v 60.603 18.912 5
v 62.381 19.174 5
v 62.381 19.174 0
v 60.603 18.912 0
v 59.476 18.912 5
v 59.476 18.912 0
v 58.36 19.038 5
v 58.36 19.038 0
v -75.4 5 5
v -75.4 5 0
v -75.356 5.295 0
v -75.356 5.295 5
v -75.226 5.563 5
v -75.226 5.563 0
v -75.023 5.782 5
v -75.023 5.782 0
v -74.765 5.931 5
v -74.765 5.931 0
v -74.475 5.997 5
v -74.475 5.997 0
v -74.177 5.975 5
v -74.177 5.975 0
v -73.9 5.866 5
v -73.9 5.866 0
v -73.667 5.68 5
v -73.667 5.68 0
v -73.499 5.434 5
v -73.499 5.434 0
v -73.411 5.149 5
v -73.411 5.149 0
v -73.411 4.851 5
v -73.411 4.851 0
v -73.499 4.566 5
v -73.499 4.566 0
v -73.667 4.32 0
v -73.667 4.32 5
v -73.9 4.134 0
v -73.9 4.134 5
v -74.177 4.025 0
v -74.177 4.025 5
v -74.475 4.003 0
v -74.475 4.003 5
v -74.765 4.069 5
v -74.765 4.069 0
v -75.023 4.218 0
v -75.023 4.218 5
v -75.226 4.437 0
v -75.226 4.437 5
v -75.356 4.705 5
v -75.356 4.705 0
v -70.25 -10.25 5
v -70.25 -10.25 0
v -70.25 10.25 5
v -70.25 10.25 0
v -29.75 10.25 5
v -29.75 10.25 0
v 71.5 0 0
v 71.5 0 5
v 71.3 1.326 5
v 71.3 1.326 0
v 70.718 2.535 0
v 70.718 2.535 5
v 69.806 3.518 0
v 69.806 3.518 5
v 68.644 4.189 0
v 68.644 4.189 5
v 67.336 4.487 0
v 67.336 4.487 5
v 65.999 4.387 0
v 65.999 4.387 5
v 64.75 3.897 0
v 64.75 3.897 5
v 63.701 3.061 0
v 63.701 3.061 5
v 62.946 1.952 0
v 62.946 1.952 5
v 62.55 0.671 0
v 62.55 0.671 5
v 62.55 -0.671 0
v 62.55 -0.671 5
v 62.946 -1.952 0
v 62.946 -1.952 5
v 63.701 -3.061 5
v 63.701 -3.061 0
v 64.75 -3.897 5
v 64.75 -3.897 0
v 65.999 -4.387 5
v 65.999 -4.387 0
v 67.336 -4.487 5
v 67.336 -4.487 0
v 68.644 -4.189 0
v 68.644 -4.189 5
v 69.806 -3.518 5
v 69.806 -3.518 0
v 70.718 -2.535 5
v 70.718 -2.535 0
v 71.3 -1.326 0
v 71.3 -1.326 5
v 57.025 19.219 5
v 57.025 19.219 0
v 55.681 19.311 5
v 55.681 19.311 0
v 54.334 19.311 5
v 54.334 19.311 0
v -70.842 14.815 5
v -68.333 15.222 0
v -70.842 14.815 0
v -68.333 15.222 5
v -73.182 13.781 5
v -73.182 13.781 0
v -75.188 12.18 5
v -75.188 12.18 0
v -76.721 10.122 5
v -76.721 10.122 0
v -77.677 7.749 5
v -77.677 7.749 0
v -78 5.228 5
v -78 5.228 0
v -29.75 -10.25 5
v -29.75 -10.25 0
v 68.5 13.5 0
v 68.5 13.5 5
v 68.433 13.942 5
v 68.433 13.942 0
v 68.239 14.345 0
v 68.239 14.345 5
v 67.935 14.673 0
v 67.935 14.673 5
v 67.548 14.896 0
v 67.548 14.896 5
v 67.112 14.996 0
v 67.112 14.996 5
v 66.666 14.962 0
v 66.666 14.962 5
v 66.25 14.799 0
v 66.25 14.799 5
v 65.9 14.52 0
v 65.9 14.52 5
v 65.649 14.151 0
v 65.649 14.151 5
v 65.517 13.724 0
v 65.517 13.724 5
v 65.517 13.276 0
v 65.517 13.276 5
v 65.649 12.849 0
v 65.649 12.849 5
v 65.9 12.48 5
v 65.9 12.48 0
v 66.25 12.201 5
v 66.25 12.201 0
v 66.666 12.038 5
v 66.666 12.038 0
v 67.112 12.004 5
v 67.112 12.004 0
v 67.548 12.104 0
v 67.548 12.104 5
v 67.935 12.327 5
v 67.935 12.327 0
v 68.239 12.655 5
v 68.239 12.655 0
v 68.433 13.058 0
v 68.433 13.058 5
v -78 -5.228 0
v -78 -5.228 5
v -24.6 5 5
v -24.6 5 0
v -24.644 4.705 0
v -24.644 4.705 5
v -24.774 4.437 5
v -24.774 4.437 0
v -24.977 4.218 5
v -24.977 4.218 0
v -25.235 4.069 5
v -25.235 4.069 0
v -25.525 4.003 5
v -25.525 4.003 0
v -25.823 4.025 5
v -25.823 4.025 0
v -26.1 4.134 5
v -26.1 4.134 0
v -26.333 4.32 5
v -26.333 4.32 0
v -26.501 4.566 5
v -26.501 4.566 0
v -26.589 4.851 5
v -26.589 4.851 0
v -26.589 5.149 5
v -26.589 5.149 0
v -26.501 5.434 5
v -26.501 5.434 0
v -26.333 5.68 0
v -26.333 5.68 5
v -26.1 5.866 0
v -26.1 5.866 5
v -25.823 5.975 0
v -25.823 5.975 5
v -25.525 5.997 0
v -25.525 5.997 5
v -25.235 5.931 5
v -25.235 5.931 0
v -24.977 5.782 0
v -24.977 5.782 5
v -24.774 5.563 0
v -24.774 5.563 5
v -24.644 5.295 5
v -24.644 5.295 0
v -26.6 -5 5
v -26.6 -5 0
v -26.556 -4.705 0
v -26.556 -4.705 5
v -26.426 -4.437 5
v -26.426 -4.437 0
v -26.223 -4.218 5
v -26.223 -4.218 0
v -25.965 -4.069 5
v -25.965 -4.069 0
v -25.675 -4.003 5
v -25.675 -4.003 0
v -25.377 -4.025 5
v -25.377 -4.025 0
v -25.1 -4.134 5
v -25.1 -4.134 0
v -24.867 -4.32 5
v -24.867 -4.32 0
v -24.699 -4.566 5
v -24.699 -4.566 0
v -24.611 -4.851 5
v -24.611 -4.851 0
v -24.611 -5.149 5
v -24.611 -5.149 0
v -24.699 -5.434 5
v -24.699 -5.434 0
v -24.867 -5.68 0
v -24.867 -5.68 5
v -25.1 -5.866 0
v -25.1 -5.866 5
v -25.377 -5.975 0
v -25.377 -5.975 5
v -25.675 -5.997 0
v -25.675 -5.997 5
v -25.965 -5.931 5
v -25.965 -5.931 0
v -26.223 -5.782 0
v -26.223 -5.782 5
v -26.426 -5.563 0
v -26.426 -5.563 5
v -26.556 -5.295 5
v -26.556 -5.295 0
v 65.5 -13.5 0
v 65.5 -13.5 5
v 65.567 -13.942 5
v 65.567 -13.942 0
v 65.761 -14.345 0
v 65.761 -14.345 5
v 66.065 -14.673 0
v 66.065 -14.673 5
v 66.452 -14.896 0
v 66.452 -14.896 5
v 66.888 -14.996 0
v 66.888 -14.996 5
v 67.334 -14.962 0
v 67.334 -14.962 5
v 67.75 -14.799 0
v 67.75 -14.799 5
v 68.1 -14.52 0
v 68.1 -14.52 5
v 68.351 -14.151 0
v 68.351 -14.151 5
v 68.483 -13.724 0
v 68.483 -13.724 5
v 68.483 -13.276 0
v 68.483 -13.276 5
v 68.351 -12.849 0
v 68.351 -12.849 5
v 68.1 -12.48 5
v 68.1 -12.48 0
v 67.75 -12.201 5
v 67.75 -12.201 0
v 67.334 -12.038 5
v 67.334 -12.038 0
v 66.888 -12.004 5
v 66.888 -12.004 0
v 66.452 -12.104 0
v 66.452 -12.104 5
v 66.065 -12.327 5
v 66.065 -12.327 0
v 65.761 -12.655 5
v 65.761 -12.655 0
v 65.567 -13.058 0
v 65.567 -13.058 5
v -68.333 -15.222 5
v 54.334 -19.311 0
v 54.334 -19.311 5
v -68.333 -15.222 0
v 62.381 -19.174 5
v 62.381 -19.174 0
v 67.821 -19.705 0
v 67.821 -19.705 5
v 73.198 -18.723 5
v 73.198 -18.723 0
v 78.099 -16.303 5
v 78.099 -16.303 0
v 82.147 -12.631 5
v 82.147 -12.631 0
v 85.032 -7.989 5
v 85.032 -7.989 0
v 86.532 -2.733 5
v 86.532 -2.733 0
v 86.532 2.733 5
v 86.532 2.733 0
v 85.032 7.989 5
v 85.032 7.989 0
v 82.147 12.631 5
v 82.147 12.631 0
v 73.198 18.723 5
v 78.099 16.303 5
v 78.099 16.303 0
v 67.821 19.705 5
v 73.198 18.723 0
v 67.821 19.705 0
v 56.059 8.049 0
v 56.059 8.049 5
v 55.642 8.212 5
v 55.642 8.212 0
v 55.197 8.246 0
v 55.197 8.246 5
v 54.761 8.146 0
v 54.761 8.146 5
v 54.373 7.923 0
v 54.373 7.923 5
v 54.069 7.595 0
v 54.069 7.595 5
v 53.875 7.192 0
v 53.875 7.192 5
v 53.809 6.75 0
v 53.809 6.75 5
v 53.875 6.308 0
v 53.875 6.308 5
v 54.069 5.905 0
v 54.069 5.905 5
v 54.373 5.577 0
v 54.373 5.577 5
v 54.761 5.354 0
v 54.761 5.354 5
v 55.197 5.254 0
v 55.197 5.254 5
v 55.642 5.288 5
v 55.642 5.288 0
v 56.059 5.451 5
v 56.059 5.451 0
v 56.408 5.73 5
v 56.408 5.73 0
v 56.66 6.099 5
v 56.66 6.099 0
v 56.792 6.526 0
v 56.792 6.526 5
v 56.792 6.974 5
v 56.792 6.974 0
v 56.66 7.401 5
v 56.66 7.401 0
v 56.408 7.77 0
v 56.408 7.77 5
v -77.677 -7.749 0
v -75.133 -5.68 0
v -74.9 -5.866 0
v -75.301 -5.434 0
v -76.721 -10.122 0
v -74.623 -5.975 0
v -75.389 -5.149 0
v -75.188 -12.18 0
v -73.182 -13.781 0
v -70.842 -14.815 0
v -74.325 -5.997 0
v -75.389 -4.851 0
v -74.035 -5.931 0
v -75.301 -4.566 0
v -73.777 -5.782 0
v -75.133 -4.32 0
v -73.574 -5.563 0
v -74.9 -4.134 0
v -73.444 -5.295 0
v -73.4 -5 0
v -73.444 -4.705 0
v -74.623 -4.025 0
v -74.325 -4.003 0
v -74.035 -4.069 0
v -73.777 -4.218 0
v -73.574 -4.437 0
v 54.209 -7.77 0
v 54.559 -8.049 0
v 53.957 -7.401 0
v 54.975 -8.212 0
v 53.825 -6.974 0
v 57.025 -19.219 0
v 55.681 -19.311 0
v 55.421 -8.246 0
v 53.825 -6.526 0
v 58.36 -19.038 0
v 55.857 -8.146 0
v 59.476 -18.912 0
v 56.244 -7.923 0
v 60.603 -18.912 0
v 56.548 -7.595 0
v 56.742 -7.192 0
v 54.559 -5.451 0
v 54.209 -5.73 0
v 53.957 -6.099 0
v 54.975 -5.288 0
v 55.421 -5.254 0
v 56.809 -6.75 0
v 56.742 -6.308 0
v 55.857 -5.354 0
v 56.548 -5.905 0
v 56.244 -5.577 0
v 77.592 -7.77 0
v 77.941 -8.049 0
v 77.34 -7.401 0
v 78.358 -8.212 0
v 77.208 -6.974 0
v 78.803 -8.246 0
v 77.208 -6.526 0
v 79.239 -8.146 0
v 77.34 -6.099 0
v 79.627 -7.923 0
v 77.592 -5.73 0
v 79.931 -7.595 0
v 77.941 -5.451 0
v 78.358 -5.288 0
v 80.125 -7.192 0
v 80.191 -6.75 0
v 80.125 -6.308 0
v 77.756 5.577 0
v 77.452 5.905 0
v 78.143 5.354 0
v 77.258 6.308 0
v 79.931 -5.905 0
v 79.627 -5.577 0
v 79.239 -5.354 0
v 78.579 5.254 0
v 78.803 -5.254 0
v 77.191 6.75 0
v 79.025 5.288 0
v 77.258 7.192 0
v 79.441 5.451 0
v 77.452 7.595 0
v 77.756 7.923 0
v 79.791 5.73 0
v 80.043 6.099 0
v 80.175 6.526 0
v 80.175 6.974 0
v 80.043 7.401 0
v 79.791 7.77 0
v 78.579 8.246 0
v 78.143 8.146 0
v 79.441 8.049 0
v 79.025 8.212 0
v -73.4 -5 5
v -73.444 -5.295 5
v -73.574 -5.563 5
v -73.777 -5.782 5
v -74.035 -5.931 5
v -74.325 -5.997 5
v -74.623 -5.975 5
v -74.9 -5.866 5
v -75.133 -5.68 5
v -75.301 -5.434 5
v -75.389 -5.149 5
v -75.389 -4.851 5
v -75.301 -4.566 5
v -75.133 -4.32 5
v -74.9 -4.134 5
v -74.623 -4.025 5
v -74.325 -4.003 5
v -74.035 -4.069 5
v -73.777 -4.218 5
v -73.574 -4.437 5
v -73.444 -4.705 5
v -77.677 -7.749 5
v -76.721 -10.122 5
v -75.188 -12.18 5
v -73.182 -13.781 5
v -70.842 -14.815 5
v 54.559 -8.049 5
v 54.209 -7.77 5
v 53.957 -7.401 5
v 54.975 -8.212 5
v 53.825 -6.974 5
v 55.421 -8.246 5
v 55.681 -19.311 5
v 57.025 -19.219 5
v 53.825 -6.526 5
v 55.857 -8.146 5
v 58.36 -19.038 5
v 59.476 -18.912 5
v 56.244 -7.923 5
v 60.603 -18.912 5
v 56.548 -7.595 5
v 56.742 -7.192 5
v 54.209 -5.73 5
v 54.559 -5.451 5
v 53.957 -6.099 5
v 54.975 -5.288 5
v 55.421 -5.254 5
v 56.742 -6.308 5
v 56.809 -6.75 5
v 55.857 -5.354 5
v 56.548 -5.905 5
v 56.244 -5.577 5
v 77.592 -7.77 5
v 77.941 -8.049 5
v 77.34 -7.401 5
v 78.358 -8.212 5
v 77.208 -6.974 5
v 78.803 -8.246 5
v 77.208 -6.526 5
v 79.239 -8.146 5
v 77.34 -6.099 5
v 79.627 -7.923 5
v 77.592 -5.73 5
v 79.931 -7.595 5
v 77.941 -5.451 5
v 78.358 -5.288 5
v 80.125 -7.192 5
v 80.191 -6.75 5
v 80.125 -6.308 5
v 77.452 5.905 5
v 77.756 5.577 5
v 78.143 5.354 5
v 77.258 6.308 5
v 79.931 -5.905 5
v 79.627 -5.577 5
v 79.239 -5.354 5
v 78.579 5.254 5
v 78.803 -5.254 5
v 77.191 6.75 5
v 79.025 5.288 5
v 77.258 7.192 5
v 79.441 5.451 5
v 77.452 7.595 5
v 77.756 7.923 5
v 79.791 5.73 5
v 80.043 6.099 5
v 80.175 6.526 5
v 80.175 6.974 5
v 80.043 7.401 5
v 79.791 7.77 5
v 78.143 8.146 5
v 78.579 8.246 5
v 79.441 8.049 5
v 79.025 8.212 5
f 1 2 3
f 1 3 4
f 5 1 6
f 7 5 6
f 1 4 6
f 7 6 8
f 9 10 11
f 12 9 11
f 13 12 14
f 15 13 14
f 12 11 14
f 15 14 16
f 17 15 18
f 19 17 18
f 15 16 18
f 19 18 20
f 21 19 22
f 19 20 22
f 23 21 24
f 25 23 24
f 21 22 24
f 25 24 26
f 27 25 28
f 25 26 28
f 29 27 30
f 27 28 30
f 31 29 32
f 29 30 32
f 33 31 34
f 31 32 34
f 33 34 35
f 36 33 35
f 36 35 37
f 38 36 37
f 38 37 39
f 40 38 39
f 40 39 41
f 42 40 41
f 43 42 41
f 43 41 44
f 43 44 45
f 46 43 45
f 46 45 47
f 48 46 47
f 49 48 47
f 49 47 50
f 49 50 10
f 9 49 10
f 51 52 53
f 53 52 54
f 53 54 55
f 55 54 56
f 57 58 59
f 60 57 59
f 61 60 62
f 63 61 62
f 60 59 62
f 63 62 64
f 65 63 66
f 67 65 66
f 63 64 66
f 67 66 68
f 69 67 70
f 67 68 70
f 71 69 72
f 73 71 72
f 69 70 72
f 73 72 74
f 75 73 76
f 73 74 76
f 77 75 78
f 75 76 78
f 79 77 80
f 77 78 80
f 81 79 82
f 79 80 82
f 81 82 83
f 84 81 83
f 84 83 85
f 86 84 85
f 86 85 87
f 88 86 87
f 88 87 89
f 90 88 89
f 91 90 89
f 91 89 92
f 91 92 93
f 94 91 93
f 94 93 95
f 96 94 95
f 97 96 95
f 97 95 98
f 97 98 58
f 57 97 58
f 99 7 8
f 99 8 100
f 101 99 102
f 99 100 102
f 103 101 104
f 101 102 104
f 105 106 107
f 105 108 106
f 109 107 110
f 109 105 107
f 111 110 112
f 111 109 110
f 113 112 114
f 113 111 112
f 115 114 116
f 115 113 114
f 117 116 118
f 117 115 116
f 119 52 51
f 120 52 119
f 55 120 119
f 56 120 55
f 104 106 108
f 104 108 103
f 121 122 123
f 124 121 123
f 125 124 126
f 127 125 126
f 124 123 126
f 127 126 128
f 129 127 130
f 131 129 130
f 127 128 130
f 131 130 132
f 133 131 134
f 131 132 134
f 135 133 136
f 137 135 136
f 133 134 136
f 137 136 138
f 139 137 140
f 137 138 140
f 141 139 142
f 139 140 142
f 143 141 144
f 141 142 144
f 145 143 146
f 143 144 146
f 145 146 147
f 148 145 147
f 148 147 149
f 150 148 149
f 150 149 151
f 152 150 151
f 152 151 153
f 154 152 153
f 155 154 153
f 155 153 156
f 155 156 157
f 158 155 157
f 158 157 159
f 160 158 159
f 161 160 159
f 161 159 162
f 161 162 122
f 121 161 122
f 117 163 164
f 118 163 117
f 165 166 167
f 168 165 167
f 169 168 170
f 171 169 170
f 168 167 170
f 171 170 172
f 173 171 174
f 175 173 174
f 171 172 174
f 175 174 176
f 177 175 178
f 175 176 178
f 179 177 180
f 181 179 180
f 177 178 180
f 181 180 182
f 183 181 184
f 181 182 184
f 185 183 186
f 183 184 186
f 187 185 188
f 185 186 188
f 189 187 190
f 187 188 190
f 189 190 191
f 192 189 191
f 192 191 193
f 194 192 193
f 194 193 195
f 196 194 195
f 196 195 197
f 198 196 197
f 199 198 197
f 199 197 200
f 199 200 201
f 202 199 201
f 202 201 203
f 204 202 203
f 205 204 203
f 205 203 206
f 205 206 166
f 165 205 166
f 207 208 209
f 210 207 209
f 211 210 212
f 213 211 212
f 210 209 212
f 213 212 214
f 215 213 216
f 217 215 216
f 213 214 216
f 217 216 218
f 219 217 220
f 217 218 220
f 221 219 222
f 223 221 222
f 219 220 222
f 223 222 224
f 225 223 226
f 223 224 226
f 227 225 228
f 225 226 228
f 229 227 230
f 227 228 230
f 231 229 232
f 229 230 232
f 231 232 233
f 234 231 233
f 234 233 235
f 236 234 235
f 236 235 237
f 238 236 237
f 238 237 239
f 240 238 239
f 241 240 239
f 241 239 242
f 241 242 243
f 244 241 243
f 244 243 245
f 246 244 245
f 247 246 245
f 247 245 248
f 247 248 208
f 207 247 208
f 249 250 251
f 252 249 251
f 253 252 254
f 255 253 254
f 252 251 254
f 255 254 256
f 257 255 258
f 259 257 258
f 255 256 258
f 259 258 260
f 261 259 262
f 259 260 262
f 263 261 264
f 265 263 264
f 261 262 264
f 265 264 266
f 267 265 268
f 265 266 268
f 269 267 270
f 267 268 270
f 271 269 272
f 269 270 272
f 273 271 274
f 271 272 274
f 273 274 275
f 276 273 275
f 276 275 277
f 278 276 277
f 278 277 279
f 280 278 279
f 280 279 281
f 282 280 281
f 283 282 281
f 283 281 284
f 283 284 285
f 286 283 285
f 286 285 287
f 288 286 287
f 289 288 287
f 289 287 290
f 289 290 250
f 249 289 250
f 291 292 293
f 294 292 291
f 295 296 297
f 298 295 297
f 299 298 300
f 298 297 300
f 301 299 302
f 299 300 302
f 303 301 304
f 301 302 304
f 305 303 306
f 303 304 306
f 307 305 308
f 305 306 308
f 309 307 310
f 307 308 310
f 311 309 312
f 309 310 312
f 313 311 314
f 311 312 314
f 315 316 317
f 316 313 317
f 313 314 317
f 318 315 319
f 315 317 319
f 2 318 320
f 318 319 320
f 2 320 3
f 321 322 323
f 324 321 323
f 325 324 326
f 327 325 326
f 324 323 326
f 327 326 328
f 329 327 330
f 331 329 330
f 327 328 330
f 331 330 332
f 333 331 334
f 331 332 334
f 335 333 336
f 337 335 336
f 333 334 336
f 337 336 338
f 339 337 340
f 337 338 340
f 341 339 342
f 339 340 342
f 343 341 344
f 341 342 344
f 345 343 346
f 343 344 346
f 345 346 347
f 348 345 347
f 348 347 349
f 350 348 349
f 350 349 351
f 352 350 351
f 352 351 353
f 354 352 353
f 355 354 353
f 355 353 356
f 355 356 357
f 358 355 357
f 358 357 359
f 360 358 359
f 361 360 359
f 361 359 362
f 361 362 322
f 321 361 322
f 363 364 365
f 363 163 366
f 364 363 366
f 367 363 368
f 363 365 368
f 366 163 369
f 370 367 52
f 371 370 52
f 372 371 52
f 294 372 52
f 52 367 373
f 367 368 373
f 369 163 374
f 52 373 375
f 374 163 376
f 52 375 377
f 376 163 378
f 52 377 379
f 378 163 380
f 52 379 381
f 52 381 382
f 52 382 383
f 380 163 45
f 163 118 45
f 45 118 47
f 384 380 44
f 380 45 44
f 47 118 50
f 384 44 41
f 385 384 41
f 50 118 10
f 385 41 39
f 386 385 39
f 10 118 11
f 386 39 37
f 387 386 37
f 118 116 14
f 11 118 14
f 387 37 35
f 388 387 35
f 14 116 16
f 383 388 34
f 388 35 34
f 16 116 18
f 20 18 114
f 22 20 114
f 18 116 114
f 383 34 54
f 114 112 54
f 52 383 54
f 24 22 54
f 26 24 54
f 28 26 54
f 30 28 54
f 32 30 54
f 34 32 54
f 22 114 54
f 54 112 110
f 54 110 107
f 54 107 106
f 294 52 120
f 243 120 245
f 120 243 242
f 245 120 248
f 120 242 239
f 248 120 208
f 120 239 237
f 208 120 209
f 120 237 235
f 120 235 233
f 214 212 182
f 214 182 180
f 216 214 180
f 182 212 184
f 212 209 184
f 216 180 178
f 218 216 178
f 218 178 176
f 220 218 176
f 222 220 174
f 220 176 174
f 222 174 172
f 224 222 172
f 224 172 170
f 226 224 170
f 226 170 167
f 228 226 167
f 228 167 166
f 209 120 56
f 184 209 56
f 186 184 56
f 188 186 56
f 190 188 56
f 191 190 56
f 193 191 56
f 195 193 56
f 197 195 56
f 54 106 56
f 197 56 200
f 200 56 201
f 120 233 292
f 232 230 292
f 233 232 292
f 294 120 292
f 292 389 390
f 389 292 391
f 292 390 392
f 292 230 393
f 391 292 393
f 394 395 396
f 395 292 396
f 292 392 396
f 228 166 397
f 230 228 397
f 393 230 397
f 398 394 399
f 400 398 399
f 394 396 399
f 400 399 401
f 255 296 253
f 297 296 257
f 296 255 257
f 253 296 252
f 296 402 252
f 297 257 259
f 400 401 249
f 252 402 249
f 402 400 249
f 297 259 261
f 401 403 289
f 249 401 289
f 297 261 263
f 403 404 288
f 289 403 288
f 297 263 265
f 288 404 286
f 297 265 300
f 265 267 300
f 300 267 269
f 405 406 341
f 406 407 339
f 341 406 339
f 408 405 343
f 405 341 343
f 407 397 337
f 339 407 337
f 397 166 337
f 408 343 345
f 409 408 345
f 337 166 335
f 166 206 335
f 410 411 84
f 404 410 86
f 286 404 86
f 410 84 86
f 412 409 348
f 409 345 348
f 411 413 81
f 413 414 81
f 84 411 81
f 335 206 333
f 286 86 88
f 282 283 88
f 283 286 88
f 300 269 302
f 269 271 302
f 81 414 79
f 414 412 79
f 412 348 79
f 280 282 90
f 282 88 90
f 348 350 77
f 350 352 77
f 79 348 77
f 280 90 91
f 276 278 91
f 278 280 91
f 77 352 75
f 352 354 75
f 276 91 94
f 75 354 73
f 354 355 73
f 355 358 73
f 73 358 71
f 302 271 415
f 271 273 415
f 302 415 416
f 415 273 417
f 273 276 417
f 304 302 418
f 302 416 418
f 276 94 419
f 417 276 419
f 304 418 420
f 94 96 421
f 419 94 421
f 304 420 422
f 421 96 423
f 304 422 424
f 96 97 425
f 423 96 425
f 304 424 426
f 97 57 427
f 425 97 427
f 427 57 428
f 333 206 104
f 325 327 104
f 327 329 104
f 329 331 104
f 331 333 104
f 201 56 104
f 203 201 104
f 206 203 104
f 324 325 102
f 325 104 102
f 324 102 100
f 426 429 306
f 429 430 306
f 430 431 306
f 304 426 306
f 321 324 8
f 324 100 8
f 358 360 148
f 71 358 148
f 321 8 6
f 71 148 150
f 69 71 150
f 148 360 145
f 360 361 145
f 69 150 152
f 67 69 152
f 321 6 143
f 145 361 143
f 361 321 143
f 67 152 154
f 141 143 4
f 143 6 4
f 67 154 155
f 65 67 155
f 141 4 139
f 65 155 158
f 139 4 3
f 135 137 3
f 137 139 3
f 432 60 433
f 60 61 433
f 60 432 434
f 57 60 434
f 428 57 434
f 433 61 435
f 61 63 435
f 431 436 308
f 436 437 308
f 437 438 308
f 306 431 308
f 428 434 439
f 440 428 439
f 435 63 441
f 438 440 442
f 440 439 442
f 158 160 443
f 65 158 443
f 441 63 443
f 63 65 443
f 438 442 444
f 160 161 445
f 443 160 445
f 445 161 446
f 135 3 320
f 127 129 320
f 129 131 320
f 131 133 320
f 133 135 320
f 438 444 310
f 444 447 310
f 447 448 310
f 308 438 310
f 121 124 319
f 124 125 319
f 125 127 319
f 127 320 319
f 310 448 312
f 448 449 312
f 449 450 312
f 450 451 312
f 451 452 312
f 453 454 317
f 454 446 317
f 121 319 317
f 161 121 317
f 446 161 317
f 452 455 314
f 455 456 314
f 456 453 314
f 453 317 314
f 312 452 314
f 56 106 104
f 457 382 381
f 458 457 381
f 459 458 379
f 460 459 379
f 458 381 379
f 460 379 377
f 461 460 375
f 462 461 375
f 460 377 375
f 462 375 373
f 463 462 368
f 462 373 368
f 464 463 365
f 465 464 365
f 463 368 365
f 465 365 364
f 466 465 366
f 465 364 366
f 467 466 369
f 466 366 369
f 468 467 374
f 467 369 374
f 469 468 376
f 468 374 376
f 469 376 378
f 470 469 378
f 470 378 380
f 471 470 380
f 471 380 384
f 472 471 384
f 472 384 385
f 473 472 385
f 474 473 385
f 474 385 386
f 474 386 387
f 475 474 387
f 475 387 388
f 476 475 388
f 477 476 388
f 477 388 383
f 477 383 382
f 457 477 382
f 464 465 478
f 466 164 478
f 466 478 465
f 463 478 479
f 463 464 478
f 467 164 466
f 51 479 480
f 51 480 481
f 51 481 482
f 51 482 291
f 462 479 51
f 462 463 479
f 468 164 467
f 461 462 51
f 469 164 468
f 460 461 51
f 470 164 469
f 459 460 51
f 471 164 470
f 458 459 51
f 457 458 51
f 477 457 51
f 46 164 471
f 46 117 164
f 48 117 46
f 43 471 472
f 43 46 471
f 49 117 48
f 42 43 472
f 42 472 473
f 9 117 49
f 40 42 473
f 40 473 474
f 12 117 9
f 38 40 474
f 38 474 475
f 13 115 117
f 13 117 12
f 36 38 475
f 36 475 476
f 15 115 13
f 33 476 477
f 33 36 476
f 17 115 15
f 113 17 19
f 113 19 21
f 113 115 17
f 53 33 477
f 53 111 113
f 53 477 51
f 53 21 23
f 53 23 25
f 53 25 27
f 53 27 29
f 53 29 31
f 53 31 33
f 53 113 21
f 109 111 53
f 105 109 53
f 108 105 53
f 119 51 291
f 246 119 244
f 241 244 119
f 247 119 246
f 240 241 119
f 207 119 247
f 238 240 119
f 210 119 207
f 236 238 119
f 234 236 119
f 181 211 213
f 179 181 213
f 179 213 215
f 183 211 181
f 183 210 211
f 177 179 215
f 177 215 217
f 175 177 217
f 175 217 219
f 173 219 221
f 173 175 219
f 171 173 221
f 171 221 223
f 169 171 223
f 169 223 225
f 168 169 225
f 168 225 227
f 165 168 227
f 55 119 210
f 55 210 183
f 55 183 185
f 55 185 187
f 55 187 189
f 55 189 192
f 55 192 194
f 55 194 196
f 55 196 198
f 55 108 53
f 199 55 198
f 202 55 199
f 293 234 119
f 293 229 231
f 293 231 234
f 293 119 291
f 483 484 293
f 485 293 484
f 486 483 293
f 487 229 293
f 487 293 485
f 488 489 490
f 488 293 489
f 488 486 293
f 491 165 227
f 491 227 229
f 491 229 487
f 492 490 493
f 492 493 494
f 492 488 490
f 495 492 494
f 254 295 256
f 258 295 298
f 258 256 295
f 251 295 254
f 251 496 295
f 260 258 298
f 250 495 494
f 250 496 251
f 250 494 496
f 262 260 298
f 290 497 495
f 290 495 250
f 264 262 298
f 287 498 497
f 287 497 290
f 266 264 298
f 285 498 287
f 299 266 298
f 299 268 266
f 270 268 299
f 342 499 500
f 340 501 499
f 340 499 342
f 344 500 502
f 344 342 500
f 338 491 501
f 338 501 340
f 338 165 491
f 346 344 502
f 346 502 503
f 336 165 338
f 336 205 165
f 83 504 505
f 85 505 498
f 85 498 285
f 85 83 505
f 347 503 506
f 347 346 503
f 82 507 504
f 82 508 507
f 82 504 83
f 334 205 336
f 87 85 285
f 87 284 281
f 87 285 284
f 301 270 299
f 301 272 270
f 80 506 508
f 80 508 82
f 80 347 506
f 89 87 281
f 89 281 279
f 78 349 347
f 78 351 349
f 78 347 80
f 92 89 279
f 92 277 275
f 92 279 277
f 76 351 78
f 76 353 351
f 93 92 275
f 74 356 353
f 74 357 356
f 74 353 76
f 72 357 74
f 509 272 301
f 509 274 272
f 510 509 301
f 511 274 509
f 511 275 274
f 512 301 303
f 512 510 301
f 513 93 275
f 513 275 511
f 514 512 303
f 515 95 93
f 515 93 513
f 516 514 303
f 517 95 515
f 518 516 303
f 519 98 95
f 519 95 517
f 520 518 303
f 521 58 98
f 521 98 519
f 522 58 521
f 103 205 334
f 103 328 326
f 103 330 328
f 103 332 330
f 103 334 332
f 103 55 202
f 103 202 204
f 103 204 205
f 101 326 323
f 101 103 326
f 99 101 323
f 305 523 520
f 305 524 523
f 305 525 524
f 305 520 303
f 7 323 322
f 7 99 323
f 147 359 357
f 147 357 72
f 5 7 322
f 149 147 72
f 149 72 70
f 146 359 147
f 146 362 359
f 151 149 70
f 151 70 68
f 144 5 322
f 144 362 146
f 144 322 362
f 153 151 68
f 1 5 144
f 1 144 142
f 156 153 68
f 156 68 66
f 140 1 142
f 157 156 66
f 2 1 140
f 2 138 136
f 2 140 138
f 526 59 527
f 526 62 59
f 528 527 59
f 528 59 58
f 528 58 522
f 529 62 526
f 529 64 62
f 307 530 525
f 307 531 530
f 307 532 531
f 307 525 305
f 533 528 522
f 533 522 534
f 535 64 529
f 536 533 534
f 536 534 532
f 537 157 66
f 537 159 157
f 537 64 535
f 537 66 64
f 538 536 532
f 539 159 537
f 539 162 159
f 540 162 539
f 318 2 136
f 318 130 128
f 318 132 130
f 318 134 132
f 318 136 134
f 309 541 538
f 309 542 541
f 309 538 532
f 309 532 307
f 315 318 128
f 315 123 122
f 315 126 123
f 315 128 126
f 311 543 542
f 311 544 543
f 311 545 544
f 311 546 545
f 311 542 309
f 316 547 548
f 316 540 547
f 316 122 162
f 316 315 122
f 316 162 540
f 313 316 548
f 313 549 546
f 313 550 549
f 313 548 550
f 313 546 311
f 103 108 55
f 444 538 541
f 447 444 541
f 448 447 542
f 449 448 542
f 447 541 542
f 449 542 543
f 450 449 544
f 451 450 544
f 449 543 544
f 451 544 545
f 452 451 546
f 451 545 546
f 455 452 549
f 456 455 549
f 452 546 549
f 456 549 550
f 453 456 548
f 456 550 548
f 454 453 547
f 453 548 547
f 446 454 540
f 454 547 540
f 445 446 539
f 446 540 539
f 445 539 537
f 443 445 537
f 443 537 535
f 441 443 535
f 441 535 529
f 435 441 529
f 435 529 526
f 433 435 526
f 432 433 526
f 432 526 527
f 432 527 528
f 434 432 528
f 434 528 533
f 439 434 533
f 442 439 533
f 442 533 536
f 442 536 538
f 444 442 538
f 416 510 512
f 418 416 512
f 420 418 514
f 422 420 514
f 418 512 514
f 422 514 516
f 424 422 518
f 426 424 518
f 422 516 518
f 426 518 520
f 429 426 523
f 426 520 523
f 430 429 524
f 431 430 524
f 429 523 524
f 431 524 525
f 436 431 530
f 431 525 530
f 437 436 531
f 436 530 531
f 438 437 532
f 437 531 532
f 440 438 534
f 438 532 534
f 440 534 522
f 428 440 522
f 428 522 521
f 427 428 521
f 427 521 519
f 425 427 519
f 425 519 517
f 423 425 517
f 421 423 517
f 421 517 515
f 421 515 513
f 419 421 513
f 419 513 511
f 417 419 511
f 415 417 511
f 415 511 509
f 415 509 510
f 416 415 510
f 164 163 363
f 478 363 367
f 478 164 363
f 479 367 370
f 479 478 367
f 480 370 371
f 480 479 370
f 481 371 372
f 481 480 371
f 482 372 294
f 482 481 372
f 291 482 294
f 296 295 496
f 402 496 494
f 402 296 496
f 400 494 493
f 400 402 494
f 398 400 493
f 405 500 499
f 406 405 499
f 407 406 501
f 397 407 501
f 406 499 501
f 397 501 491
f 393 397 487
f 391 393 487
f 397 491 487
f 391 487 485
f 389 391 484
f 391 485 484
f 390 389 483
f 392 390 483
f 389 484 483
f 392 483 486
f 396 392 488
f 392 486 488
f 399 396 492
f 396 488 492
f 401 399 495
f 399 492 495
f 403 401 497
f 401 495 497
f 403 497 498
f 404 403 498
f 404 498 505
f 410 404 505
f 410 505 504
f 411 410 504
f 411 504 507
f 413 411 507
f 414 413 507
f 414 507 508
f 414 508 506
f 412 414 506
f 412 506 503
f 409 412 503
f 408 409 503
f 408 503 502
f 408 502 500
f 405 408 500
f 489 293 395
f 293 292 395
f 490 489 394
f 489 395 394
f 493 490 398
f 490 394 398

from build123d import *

# Parameters (mm, degrees)
SKETCH1_R           = 3
SKETCH1_W           = 40.5
SKETCH1_H           = 20.5
BOSS_EXTRUDE1_DEPTH = 5
FILLET2_R           = 20
BOSS_EXTRUDE2_START = -5
SKETCH3_R           = 19.722379498
SKETCH3_R_2         = 3
BOSS_EXTRUDE2_DEPTH = 5
FILLET3_R           = 10
SKETCH4_R           = 1
CUT_EXTRUDE1_DEPTH  = 6
SKETCH5_R           = 1.5
CUT_EXTRUDE2_DEPTH  = 6
SKETCH6_R           = 4.5
CUT_EXTRUDE3_DEPTH  = 6
CIRPATTERN1_COUNT   = 6


with BuildPart() as part:
    # Sketch1 → Boss-Extrude1 (new body)
    with BuildSketch(Plane.XY):
        Polygon((75, 20), (75, -20), (-75, -15), (-78, -15), (-78, 15), (-75, 15), align=None)
        with Locations((67, 0)):
            Circle(SKETCH1_R, mode=Mode.SUBTRACT)
        with Locations((-50, 0)):
            Rectangle(SKETCH1_W, SKETCH1_H, mode=Mode.SUBTRACT)
    extrude(amount=BOSS_EXTRUDE1_DEPTH)

    # Fillet2
    # the kernel refuses this fillet: 20 mm, written as the material it takes off along each edge
    with BuildSketch(Plane(origin=(75, -20, -51.694436733), x_dir=(0, 1, 0), z_dir=(0, 0, 1))) as fillet2_piece_1:
        with BuildLine():
            CenterArc((FILLET2_R * 1.03388873465, FILLET2_R), FILLET2_R, 178.090847567, 91.909152433)
            Line((FILLET2_R * 0.0344438276744, FILLET2_R * 1.03331483023), (0, 0))
            Line((0, 0), (FILLET2_R * 1.03388873465, 0))
        make_face()
    extrude(amount=108.388873465, mode=Mode.SUBTRACT)
    with BuildSketch(Plane(origin=(75, 20, -51.694436733), x_dir=(0, -1, 0), z_dir=(0, 0, 1))) as fillet2_piece_2:
        with BuildLine():
            CenterArc((FILLET2_R * 1.03388873465, -FILLET2_R), FILLET2_R, 90, 91.909152433)
            Line((FILLET2_R * 0.0344438276744, -FILLET2_R * 1.03331483023), (0, 0))
            Line((0, 0), (FILLET2_R * 1.03388873465, 0))
        make_face()
    extrude(amount=108.388873465, mode=Mode.SUBTRACT)

    # Sketch3 → Boss-Extrude2 (add)
    with BuildSketch(Plane.XY.offset(5).offset(BOSS_EXTRUDE2_START)):
        with Locations((67, 0)):
            Circle(SKETCH3_R)
        with Locations((67, 0)):
            Circle(SKETCH3_R_2, mode=Mode.SUBTRACT)
    extrude(amount=BOSS_EXTRUDE2_DEPTH)

    # Fillet3
    fillet3_edges = [part.edges().sort_by_distance(p)[0] for p in [
        (-78, 15, 2.5),
        (-78, -15, 2.5),
        (60.390814278, -18.582005197, 2.5),
        (60.390814278, 18.582005197, 2.5),
    ]]
    fillet(fillet3_edges, radius=FILLET3_R)

    # Sketch4 → Cut-Extrude1 (cut)
    with BuildSketch(Plane(origin=(0, 0, 0), x_dir=(-1, 0, 0), z_dir=(0, 0, -1))):
        with Locations((25.6, -5)):
            Circle(SKETCH4_R)
        with Locations(Location((25.6, 5, 0), (0, 0, 180))):
            Circle(SKETCH4_R)
        with Locations((74.4, 5)):
            Circle(SKETCH4_R)
        with Locations(Location((74.4, -5, 0), (0, 0, 180))):
            Circle(SKETCH4_R)
    extrude(amount=-CUT_EXTRUDE1_DEPTH, mode=Mode.SUBTRACT)

    # Sketch5 → Cut-Extrude2 (cut)
    with BuildSketch(Plane.XY.offset(5)):
        with Locations((67, 13.5)):
            Circle(SKETCH5_R)
    cut_extrude2 = extrude(amount=-CUT_EXTRUDE2_DEPTH, mode=Mode.SUBTRACT)

    # Sketch6 → Cut-Extrude3 (cut)
    with BuildSketch(Plane.XY.offset(5)):
        with Locations((67, 0)):
            Circle(SKETCH6_R)
    extrude(amount=-CUT_EXTRUDE3_DEPTH, mode=Mode.SUBTRACT)

    # CirPattern1: Cut-Extrude2 ×6 about axis
    cirpattern1_axis = Axis((67, 0, 0), (0, 0, 1))
    for i in range(1, CIRPATTERN1_COUNT):
        add(cut_extrude2.rotate(cirpattern1_axis, i * 360 / CIRPATTERN1_COUNT), mode=Mode.SUBTRACT)


solid = part.part
